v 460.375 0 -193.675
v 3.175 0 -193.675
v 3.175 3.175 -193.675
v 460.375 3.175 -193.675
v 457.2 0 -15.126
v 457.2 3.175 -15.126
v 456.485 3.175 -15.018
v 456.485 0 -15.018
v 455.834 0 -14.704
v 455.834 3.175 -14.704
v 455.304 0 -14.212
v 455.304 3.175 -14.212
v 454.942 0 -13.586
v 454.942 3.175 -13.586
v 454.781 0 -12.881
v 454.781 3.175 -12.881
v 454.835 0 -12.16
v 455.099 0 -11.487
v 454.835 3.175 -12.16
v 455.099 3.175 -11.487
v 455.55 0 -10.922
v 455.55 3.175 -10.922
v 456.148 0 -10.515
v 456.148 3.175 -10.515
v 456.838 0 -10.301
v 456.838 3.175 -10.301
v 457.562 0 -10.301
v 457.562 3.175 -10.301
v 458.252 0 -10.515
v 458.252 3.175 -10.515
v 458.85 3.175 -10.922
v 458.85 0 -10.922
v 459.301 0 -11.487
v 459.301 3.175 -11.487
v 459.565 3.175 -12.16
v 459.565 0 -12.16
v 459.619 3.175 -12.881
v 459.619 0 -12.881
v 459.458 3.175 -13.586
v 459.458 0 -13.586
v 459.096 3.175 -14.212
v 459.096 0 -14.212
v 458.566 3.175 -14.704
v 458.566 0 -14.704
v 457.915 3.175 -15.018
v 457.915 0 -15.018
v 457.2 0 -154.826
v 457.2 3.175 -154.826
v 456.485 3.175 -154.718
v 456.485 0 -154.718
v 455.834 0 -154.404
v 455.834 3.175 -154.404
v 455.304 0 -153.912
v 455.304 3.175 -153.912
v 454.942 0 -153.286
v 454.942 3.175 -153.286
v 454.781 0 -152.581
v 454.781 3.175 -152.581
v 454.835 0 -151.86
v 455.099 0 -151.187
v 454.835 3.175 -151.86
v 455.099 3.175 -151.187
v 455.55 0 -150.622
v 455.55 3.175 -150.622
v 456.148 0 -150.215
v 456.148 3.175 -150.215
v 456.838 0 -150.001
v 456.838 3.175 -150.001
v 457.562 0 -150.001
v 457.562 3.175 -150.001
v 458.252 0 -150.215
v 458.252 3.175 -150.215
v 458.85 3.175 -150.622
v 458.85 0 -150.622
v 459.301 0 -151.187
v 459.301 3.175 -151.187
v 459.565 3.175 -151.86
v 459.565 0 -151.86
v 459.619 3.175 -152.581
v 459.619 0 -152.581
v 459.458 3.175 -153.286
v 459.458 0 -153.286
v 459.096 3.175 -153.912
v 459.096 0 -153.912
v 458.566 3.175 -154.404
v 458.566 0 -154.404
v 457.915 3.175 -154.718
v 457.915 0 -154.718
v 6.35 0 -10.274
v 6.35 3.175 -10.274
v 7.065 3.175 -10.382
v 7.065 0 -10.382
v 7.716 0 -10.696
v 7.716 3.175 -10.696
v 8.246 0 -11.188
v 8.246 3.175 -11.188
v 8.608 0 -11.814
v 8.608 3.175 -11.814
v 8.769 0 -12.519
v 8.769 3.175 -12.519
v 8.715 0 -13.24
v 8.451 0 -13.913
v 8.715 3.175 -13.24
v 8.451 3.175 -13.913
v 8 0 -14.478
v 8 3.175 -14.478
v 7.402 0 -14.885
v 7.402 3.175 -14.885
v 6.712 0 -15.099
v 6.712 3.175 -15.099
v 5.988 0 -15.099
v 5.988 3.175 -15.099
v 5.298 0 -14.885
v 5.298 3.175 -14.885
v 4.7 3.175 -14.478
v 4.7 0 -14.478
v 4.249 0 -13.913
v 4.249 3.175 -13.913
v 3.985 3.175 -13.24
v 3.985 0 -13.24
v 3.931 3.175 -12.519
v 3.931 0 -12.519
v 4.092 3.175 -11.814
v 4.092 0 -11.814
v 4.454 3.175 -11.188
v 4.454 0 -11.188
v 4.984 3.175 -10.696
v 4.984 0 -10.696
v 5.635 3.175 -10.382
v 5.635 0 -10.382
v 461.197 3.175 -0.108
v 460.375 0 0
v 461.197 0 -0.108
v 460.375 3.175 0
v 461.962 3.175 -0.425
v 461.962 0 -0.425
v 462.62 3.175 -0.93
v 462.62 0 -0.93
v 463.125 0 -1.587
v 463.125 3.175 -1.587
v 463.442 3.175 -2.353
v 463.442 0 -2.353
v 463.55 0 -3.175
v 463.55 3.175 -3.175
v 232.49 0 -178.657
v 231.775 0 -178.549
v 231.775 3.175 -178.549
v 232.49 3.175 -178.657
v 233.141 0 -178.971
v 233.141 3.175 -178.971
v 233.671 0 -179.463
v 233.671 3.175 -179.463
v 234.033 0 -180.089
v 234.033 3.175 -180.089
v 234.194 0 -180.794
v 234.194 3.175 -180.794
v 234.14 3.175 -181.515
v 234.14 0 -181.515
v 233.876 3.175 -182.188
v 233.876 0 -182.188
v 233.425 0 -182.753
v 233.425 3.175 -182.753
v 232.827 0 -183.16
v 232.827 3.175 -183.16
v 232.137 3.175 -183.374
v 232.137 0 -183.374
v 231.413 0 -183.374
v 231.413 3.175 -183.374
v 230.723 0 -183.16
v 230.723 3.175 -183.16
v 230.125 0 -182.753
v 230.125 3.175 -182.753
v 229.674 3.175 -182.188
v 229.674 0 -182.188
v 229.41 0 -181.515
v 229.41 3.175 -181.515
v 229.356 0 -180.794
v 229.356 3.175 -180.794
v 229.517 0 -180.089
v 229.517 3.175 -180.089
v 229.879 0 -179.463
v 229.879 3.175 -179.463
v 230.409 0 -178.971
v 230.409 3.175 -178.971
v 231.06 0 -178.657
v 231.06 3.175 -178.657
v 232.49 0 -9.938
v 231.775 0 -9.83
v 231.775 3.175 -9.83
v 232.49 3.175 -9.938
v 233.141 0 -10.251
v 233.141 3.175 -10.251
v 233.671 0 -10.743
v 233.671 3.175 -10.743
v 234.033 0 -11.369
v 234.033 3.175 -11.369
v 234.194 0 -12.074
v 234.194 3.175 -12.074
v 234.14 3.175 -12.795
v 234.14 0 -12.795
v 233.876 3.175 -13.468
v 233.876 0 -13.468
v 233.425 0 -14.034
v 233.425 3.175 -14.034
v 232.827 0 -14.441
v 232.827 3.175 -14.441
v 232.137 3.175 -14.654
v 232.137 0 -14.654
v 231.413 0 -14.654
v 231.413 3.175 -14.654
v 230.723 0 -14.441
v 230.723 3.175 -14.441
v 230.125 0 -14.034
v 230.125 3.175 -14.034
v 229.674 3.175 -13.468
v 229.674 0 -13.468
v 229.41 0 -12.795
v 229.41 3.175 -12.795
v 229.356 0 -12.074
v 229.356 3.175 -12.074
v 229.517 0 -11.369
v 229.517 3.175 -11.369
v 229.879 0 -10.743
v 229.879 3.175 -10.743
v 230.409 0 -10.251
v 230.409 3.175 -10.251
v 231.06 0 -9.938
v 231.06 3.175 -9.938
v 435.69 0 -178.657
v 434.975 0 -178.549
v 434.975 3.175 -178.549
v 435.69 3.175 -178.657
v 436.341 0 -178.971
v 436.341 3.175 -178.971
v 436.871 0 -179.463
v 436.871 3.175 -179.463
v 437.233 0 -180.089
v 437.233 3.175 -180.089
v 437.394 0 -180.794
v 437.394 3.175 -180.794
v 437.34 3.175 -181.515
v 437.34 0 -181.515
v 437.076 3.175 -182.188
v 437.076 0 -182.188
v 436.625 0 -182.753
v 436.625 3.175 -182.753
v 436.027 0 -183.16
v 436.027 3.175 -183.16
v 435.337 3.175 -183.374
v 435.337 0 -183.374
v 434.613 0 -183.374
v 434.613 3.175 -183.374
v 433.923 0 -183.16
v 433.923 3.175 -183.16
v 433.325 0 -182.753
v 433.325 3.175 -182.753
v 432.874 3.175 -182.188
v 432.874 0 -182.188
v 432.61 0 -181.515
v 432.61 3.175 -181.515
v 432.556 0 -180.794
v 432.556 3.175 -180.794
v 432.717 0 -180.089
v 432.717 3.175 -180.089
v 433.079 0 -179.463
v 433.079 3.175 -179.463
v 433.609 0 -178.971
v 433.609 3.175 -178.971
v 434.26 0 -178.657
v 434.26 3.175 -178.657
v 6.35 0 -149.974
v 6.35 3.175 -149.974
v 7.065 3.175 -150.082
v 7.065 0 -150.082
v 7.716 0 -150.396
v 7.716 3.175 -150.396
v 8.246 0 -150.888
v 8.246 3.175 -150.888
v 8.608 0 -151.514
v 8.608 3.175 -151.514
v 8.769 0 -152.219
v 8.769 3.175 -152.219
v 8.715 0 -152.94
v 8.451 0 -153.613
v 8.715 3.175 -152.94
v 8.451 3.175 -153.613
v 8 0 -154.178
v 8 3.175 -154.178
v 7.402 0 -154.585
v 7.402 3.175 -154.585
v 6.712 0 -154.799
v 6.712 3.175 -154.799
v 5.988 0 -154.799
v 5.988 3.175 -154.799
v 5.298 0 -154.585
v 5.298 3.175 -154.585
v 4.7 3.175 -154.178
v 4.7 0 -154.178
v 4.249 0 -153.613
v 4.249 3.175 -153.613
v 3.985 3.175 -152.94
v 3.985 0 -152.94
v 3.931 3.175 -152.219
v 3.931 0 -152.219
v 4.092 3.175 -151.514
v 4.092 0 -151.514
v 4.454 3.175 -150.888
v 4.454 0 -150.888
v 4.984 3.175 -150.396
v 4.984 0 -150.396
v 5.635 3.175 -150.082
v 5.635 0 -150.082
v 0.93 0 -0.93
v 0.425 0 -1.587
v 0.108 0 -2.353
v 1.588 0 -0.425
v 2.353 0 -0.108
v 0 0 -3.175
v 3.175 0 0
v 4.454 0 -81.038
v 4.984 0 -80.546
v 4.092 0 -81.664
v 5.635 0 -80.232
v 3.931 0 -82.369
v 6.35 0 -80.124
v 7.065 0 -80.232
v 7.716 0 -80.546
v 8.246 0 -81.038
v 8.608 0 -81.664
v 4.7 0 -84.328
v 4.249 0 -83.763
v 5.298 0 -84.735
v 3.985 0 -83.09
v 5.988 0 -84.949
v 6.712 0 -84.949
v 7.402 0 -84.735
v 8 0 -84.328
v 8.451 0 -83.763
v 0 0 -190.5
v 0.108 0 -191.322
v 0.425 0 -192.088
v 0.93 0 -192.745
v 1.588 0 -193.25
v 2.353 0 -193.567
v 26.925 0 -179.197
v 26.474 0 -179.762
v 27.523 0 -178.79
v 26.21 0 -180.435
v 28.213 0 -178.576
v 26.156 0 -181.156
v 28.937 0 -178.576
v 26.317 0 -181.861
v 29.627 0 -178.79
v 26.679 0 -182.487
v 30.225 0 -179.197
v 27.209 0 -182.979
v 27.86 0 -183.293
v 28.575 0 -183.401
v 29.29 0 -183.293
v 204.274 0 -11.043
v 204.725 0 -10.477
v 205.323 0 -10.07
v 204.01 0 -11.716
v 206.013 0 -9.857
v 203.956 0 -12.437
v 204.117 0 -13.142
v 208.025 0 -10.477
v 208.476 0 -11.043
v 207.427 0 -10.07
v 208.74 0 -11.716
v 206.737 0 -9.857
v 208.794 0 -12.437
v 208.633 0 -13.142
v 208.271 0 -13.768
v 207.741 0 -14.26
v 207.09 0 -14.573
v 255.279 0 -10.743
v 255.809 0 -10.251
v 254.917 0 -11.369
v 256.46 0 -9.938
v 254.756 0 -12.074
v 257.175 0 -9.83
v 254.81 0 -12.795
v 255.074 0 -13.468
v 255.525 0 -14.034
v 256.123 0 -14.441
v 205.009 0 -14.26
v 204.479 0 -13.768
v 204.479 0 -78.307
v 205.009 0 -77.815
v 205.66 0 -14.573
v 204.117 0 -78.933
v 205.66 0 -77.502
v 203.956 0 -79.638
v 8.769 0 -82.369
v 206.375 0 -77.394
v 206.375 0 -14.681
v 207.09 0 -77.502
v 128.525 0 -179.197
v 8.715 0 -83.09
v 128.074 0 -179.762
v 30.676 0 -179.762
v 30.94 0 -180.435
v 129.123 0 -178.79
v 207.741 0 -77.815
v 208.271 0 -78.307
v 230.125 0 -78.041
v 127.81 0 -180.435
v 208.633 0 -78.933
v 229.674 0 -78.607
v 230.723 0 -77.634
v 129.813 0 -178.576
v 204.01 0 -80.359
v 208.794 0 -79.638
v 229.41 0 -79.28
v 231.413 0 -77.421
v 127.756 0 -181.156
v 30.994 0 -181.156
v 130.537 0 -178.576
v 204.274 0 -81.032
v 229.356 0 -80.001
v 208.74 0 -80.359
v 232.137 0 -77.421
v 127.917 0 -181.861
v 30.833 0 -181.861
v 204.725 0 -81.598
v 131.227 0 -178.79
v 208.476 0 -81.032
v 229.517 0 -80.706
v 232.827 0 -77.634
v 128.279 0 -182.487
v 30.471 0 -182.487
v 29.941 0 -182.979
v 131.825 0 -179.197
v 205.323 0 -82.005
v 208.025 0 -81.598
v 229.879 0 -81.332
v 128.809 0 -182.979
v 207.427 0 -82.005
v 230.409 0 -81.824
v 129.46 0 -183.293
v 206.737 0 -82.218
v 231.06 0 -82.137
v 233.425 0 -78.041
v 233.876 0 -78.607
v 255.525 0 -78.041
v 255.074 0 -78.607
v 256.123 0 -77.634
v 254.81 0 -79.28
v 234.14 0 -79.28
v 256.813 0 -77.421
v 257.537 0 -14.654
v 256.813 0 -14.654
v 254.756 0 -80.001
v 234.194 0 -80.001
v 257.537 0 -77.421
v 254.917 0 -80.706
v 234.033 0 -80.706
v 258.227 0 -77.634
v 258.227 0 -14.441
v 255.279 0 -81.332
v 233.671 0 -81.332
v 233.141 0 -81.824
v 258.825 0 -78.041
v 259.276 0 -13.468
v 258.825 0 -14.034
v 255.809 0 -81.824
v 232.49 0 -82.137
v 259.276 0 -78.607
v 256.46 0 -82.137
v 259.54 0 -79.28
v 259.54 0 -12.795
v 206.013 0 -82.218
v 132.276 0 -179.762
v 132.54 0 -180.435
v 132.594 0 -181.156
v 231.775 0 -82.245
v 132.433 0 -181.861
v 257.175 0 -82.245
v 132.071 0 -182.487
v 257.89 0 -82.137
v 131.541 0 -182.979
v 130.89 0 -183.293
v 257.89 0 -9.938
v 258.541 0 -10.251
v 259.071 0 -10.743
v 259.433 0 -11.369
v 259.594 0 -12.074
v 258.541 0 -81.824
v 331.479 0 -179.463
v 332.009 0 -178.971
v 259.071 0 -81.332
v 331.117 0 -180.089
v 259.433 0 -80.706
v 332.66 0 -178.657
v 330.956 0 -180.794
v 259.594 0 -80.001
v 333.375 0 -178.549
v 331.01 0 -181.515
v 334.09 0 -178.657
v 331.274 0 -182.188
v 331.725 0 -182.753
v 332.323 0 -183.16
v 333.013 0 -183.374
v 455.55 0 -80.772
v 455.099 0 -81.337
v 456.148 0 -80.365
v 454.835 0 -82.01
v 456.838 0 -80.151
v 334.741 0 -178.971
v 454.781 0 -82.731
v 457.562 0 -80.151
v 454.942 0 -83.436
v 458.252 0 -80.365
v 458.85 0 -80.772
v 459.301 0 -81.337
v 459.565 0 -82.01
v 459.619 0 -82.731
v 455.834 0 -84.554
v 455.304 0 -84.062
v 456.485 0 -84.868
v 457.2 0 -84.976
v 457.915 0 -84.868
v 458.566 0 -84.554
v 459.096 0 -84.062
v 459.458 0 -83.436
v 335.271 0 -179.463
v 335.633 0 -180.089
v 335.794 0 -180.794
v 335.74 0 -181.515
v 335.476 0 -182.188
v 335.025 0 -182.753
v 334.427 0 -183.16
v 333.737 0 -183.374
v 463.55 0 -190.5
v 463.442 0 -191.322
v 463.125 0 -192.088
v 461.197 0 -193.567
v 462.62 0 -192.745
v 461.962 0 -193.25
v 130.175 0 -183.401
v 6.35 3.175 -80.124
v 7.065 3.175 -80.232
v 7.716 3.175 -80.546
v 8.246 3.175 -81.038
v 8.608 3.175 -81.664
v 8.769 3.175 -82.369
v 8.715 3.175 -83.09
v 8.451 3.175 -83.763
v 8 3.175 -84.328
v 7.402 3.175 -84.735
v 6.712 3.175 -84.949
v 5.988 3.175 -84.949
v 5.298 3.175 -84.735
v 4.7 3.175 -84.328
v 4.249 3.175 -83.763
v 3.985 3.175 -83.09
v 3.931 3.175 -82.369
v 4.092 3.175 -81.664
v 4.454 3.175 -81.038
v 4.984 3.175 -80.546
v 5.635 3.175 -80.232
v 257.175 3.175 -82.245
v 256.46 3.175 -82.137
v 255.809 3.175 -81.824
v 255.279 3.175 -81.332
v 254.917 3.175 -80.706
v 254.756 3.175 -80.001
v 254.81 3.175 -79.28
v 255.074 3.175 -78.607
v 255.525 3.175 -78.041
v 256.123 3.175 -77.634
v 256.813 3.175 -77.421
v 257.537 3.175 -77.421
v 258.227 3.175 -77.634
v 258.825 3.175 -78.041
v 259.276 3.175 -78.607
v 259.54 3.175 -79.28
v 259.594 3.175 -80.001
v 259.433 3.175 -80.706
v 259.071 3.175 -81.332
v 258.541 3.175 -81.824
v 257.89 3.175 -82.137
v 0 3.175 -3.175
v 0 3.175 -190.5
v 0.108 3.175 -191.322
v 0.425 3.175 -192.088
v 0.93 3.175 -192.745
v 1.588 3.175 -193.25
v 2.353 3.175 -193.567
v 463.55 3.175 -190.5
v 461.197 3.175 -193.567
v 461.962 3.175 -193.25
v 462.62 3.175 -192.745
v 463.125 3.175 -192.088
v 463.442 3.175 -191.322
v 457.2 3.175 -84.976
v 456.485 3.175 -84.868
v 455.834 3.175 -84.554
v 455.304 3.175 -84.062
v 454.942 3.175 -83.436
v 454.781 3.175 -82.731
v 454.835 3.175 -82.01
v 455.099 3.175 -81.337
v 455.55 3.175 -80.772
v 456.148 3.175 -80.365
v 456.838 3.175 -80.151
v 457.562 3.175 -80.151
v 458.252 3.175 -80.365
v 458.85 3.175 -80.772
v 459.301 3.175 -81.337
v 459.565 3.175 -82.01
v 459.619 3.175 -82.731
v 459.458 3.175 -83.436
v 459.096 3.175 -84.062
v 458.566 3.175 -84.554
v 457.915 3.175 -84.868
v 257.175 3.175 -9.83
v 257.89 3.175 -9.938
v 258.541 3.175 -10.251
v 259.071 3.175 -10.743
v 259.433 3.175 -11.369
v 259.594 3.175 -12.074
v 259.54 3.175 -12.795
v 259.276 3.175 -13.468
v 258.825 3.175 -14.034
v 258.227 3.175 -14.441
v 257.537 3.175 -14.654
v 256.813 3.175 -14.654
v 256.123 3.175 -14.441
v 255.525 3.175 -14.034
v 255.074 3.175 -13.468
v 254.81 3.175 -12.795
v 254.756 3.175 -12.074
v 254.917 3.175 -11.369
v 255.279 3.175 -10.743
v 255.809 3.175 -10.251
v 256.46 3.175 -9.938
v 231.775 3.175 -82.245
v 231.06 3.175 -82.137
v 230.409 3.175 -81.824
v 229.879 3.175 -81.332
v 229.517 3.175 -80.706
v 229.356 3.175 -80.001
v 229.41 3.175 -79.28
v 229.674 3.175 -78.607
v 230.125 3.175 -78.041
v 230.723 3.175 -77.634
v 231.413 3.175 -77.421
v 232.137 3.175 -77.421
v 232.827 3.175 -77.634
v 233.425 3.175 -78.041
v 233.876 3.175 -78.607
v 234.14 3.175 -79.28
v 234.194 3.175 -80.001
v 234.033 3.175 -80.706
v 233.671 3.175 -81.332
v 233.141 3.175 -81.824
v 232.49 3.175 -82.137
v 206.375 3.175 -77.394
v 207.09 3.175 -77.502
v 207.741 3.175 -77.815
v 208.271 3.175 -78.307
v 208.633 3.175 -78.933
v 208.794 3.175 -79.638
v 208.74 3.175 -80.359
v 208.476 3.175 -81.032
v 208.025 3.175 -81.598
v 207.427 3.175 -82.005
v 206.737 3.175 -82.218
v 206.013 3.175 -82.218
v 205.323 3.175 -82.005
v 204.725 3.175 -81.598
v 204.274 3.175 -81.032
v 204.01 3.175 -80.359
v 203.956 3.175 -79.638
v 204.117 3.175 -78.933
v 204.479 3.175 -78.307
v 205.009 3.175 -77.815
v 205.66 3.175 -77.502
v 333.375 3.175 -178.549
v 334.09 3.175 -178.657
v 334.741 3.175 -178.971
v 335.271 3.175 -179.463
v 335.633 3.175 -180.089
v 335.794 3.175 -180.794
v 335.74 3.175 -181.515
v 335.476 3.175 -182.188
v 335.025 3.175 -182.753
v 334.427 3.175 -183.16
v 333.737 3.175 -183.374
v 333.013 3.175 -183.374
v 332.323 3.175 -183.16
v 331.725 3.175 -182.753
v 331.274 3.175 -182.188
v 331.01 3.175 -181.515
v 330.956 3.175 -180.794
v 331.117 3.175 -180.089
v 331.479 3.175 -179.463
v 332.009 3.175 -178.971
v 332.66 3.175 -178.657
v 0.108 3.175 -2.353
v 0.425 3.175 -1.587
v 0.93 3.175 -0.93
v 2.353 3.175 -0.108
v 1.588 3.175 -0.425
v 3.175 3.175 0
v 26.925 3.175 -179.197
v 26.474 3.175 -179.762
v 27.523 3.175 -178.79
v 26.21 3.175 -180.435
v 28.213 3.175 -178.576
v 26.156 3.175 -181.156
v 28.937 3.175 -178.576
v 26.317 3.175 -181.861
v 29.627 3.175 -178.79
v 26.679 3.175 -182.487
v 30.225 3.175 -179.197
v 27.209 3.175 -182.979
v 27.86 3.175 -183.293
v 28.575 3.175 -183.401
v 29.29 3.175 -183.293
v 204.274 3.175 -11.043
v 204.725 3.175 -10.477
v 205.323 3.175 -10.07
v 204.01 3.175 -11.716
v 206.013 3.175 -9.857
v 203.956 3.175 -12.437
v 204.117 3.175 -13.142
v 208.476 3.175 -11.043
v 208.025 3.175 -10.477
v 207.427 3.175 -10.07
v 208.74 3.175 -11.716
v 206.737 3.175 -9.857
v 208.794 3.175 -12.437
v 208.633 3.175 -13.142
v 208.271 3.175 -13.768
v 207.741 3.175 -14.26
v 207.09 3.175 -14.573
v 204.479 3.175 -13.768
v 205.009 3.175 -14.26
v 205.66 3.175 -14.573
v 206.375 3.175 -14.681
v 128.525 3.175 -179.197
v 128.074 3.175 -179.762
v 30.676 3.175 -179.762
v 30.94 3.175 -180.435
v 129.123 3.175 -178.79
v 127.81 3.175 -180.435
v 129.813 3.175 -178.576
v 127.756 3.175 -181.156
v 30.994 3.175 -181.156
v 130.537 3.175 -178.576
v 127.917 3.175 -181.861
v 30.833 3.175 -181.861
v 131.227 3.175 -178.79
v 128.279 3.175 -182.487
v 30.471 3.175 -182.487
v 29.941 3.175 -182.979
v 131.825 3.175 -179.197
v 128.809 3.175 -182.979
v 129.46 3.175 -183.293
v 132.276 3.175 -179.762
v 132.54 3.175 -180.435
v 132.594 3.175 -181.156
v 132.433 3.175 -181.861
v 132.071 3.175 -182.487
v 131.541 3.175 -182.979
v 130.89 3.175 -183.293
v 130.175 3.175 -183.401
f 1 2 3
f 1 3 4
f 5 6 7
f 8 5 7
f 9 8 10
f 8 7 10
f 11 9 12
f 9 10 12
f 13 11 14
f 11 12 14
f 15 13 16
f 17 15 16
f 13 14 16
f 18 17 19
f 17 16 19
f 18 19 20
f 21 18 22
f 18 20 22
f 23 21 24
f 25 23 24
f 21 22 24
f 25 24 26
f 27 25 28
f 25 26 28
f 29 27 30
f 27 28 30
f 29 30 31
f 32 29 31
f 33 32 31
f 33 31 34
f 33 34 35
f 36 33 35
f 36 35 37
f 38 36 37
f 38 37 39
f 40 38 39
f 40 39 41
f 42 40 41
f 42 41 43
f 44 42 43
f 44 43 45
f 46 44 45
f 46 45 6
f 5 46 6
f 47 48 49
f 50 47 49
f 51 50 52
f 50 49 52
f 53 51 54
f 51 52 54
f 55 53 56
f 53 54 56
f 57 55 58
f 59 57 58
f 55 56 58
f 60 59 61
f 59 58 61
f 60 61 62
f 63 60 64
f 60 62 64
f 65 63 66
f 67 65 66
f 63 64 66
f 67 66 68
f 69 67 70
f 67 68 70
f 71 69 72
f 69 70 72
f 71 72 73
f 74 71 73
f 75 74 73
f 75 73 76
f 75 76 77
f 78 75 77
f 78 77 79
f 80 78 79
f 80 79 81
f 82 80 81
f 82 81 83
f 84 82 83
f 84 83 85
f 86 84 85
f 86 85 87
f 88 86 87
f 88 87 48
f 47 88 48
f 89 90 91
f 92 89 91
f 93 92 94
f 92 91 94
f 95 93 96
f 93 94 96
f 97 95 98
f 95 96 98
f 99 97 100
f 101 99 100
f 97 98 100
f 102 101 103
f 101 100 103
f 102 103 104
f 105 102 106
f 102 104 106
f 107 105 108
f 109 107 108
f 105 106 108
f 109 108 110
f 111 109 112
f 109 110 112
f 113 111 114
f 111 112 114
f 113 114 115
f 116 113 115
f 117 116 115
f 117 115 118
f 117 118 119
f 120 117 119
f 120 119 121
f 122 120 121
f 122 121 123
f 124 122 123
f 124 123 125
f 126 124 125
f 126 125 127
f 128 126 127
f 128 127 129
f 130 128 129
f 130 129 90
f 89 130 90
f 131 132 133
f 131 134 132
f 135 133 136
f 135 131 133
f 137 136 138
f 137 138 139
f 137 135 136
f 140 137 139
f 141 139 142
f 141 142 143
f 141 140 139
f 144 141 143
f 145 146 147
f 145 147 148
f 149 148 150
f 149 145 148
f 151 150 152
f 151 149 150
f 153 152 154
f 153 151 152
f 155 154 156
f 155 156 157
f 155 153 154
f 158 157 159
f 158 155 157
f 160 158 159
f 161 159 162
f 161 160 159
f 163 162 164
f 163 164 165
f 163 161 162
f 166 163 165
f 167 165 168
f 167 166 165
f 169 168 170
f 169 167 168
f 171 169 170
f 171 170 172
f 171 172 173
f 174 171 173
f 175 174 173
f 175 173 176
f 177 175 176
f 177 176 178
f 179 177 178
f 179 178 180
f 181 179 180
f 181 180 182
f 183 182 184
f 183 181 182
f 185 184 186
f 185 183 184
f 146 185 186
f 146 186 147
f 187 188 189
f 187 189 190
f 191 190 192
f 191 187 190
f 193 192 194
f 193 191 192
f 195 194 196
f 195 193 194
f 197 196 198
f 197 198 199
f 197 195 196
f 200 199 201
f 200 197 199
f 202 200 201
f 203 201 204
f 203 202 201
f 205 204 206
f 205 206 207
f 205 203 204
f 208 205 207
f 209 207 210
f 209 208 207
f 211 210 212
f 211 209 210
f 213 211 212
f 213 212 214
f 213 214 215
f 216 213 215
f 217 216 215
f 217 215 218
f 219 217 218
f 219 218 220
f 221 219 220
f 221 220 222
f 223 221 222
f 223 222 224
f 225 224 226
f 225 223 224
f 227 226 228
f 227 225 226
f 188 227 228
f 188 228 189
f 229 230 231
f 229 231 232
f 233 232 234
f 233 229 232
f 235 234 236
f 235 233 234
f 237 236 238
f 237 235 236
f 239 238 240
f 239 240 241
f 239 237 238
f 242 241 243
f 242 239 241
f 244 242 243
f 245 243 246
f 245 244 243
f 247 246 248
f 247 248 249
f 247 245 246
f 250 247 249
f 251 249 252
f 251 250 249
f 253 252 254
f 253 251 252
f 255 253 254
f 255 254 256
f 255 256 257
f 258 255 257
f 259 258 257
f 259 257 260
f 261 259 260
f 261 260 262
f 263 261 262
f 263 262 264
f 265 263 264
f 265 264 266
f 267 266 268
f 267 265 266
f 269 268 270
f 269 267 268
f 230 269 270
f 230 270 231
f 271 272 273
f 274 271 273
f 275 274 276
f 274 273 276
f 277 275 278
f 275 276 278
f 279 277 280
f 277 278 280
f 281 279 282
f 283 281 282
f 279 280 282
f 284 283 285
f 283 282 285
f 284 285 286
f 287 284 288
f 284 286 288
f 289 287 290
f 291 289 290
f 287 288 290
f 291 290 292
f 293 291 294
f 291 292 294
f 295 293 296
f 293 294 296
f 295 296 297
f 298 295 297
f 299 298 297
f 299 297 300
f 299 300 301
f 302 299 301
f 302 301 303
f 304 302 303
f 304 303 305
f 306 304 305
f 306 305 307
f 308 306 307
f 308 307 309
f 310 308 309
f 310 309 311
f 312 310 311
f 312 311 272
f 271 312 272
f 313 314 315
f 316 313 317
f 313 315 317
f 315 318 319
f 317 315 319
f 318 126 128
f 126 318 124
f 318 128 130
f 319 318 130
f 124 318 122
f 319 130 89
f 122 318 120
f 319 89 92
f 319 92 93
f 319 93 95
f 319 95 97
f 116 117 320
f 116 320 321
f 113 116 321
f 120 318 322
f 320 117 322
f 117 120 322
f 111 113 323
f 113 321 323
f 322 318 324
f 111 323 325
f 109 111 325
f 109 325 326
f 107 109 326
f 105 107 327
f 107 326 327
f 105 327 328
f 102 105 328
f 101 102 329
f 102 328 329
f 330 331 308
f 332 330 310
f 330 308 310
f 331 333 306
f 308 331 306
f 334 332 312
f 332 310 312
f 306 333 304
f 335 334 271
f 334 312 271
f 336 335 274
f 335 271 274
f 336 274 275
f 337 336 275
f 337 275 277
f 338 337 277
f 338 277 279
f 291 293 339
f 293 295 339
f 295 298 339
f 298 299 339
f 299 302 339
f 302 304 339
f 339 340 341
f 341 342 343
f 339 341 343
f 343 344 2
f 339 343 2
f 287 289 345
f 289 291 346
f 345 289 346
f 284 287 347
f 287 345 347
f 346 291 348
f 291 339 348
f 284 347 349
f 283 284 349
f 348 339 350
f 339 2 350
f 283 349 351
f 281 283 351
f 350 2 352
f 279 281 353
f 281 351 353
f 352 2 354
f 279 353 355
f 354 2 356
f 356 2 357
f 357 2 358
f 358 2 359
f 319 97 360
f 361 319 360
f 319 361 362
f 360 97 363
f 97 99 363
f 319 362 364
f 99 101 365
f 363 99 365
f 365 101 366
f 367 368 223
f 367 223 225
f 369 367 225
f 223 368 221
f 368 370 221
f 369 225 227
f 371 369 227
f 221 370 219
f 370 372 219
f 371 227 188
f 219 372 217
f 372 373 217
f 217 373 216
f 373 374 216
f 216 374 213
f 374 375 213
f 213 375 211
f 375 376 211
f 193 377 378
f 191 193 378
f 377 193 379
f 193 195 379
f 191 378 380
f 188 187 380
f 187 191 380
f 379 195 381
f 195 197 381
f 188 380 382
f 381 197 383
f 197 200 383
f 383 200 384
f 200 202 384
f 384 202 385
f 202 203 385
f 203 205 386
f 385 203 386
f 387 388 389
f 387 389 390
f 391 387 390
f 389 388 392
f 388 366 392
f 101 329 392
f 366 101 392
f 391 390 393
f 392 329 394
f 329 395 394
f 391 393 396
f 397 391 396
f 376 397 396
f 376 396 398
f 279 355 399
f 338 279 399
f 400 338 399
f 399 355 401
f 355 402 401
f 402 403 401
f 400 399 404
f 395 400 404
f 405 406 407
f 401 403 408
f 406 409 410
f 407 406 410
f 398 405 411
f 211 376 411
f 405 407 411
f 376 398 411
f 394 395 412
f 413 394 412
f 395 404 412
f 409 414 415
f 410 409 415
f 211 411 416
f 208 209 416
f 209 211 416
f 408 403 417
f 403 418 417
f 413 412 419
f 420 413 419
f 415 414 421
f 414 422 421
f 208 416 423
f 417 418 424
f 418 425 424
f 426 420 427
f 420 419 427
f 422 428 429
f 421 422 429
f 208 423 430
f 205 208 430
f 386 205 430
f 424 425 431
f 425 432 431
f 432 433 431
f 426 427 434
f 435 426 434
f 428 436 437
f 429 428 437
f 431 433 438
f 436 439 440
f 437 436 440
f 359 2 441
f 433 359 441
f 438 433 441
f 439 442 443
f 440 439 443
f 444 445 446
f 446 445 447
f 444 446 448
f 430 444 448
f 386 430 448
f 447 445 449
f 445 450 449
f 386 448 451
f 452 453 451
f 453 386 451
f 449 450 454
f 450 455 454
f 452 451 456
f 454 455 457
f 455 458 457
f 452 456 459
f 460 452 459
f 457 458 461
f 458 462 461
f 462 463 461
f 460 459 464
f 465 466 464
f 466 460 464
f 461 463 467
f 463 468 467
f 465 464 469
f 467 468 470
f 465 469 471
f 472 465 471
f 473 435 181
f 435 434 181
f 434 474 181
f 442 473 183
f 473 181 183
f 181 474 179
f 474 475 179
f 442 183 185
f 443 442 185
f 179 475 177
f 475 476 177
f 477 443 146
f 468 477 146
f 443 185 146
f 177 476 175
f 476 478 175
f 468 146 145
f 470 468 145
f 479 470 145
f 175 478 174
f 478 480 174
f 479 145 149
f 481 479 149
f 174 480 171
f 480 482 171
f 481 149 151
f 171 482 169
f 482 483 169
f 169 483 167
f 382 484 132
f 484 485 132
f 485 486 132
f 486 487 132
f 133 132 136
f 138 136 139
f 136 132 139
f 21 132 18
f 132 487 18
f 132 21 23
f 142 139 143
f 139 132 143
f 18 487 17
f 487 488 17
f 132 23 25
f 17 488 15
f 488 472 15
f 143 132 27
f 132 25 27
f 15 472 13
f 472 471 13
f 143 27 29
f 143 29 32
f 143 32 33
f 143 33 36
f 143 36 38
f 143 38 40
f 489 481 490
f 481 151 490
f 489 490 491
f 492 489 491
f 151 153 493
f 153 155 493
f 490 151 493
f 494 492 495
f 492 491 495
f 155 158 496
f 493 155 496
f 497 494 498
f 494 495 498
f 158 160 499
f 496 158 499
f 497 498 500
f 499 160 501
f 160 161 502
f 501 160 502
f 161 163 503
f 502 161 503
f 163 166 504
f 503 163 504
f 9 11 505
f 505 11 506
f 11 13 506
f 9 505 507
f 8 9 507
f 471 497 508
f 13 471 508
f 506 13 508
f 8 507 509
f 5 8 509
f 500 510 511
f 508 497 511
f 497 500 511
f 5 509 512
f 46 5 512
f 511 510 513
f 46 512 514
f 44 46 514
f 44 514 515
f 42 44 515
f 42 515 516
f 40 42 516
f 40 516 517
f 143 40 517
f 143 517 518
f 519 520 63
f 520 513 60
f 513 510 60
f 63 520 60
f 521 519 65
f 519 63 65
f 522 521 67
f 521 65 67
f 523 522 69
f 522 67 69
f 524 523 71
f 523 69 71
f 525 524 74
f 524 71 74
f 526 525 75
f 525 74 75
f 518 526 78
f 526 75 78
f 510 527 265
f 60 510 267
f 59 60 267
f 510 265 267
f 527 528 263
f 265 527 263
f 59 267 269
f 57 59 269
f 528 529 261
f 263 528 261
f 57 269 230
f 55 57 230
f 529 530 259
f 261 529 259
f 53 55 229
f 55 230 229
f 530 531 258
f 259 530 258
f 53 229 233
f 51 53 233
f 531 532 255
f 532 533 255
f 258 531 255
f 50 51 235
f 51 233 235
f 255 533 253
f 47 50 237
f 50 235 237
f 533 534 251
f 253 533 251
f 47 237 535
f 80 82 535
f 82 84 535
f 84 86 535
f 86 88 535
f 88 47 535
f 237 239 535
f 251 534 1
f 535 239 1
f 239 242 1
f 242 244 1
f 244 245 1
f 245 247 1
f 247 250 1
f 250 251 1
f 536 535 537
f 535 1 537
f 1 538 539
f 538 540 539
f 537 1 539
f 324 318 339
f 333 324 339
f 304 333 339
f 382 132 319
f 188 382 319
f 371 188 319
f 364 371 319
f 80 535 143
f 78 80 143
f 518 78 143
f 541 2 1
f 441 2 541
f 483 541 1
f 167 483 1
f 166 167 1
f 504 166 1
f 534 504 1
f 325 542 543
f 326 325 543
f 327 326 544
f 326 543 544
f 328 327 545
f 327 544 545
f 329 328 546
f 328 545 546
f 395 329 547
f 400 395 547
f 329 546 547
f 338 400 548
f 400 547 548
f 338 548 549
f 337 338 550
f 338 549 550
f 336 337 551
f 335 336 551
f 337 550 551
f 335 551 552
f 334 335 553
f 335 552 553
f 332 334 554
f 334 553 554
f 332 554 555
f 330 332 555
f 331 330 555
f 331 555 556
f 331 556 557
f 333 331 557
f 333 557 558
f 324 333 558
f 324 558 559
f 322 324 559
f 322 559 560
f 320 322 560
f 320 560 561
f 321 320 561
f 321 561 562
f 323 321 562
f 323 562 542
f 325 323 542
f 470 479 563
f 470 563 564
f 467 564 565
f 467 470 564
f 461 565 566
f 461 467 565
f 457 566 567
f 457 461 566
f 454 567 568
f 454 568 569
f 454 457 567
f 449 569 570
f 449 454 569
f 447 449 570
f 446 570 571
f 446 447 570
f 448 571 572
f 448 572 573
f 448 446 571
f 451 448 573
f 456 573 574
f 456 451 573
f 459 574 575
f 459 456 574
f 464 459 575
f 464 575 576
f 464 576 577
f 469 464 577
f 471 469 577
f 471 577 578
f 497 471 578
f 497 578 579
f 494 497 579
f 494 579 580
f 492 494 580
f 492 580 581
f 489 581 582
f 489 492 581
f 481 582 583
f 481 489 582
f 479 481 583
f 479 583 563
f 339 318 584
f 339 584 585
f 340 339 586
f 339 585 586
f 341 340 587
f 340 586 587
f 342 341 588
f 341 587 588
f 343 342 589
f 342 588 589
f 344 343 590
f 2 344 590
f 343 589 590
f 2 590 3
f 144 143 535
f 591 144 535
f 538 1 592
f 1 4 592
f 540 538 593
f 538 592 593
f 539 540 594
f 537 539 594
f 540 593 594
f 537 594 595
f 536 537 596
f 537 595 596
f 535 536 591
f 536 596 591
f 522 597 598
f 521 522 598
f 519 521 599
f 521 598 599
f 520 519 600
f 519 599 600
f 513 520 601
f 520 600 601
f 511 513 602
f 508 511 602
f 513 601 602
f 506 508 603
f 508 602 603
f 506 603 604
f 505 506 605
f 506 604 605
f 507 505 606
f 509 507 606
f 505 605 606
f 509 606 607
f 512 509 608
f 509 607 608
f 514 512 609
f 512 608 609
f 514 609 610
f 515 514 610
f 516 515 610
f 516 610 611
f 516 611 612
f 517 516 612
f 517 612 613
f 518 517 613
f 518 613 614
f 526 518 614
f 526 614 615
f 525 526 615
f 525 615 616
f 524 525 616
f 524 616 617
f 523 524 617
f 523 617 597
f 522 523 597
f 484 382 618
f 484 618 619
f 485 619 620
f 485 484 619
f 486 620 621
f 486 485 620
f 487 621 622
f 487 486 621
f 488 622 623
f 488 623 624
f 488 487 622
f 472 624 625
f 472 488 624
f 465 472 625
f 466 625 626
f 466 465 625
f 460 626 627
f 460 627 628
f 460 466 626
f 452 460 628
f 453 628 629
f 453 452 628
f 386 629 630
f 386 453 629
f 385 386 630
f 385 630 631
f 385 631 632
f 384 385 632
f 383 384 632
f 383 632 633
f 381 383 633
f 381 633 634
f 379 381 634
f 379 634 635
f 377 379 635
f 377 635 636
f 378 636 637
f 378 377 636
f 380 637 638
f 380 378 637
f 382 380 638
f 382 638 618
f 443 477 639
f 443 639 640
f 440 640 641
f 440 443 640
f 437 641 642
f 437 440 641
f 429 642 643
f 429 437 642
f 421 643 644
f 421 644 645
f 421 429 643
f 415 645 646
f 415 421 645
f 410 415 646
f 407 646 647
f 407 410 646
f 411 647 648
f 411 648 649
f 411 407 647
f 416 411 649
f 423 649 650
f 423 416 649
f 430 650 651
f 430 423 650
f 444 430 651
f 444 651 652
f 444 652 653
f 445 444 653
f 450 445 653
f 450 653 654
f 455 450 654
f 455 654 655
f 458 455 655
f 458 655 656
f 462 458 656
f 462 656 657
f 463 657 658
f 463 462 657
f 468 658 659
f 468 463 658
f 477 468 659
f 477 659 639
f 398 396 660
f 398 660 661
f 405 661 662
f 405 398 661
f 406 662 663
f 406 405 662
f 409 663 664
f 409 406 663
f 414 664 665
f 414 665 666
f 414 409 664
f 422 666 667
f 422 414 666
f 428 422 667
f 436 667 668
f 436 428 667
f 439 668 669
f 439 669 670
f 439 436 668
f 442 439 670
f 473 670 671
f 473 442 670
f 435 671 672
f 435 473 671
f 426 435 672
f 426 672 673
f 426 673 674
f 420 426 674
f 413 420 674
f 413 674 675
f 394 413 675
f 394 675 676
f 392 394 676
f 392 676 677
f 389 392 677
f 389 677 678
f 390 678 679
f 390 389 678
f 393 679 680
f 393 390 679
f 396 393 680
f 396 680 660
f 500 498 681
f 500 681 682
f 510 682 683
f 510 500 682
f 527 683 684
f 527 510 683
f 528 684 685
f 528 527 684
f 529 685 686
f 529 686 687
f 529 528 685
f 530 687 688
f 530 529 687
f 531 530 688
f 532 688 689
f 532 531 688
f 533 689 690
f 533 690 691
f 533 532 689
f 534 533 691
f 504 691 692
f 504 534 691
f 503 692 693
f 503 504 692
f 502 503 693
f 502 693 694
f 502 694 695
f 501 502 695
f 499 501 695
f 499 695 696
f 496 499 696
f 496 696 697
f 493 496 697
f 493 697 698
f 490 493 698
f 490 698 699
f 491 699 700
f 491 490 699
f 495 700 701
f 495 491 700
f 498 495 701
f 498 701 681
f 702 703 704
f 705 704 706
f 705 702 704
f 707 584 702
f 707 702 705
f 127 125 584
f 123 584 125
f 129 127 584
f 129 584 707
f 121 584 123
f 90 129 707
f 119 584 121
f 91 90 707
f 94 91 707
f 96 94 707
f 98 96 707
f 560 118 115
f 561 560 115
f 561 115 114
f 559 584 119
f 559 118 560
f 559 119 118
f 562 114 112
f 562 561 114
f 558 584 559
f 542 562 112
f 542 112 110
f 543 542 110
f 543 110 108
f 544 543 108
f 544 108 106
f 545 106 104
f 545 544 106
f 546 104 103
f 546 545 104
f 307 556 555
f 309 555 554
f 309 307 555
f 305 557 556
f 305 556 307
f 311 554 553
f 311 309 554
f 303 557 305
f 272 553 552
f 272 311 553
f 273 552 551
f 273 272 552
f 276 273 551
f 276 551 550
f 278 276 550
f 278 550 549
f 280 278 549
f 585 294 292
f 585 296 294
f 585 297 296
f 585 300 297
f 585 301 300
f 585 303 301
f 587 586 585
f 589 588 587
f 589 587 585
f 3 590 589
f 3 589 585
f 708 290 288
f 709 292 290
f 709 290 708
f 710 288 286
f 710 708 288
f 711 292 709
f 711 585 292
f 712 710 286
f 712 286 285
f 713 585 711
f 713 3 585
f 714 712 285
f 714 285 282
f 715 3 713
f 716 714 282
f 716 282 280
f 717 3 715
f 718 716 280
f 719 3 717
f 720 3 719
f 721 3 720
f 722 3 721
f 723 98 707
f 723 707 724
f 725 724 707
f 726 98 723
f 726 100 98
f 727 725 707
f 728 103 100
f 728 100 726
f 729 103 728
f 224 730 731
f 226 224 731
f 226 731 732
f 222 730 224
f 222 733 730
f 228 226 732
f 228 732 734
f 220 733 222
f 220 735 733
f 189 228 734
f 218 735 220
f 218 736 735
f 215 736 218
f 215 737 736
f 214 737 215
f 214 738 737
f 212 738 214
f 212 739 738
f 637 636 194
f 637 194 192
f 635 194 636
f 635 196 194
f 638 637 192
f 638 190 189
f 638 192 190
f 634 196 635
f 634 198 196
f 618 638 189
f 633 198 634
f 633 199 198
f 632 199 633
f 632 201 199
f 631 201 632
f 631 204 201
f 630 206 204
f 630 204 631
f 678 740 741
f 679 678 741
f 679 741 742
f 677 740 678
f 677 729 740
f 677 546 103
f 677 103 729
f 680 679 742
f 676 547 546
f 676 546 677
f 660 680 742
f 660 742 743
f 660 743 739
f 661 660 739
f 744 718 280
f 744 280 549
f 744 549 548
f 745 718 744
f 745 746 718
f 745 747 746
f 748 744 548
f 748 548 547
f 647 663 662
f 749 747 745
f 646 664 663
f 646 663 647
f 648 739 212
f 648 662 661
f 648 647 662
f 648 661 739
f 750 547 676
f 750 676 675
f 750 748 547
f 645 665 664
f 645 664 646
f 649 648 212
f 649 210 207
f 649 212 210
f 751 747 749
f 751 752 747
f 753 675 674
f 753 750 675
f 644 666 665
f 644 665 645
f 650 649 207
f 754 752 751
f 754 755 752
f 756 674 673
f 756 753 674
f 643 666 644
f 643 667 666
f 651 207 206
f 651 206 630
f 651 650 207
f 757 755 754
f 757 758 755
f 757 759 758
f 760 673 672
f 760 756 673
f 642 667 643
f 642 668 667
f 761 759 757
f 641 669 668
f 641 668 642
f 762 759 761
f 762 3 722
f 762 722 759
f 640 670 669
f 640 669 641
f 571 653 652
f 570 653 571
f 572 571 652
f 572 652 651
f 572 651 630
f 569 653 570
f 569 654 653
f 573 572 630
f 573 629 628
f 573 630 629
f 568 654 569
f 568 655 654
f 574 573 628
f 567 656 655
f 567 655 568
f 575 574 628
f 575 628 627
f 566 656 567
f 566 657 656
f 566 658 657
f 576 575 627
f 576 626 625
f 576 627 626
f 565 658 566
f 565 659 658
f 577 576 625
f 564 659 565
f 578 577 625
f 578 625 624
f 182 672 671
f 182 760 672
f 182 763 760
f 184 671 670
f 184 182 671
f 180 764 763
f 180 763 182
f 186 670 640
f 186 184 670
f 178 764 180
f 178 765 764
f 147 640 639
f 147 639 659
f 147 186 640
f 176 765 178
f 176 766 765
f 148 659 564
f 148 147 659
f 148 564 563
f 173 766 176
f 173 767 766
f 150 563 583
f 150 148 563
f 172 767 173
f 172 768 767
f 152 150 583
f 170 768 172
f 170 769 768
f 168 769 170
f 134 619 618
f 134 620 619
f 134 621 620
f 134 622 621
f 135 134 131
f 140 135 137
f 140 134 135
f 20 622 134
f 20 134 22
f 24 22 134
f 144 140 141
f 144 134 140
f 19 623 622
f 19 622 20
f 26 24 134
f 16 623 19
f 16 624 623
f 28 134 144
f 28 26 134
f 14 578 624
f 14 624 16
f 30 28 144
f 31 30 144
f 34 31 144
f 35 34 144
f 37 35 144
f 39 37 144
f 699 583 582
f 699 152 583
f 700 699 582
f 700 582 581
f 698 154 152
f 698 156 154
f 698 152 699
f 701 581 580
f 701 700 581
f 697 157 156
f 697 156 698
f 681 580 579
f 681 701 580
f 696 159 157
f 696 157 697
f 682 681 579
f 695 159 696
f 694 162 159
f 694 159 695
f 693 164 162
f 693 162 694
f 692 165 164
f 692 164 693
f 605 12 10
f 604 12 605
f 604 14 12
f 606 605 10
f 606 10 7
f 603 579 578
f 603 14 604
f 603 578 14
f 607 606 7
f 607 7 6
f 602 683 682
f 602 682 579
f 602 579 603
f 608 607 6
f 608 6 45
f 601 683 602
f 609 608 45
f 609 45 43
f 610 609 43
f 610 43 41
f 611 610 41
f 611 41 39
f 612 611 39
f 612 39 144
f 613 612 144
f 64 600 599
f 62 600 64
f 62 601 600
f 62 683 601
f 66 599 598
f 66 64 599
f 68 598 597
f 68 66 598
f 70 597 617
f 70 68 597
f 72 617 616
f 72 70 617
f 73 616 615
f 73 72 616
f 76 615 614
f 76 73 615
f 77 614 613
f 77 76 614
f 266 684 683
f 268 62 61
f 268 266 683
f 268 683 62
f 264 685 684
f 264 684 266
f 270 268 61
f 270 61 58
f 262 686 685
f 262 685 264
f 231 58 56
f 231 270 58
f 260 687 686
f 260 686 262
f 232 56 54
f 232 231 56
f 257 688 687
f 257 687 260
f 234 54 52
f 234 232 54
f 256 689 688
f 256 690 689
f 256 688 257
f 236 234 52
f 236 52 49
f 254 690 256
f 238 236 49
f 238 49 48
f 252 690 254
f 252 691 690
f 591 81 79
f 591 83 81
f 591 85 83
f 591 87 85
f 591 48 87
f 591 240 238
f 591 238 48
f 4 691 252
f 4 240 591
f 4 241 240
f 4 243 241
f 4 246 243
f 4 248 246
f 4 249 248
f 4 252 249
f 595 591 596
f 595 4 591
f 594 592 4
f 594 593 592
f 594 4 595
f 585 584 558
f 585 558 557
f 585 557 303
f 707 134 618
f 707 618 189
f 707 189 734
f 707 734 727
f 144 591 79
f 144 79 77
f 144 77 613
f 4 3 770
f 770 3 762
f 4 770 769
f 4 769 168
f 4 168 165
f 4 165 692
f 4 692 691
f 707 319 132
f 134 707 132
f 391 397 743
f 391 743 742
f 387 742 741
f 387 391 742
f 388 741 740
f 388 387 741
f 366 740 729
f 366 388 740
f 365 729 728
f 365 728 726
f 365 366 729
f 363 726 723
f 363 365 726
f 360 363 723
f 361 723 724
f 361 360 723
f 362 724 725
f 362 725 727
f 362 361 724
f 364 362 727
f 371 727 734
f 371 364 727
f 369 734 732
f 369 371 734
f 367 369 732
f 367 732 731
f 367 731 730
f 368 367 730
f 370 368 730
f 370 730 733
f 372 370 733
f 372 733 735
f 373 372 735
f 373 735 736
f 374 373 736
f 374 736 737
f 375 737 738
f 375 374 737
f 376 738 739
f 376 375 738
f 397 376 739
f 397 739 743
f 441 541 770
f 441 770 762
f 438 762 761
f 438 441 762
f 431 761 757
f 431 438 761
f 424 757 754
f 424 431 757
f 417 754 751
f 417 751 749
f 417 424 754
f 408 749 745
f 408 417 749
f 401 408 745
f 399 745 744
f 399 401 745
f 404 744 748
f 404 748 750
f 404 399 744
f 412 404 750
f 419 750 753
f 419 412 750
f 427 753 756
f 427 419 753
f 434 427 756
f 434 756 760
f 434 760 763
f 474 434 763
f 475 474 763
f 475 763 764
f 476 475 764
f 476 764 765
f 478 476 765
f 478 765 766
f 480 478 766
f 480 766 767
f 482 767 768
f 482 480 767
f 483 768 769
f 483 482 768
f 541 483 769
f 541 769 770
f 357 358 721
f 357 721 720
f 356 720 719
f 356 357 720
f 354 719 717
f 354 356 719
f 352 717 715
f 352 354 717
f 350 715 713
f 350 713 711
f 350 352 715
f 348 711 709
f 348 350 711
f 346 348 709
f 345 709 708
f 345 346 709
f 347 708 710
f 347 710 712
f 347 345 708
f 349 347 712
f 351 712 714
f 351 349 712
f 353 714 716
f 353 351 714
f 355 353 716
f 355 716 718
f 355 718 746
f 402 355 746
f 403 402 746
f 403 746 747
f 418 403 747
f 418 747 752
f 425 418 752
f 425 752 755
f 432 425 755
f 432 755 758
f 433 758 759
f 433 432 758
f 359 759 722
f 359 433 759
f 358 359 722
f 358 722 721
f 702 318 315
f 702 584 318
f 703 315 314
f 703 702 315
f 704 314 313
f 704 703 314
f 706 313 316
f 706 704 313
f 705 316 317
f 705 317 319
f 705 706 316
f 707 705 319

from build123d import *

# Parameters (mm, degrees)
SKETCH1_W           = 463.55
SKETCH1_H           = 193.675
SKETCH1_R           = 2.4257
BOSS_EXTRUDE1_DEPTH = 3.175
SKETCH2_R           = 2.4257
CUT_EXTRUDE1_DEPTH  = 503.392962481
FILLET1_R           = 3.175


with BuildPart() as part:
    # Sketch1 → Boss-Extrude1 (new body)
    with BuildSketch(Plane(origin=(0, 0, 0), x_dir=(1, 0, 0), z_dir=(0, 1, 0))):
        with Locations((231.775, 96.8375)):
            Rectangle(SKETCH1_W, SKETCH1_H)
        with Locations(Location((231.775, 12.2555, 0), (0, 0, 270))):
            Circle(SKETCH1_R, mode=Mode.SUBTRACT)
        with Locations(Location((257.175, 12.2555, 0), (0, 0, 270))):
            Circle(SKETCH1_R, mode=Mode.SUBTRACT)
        with Locations(Location((206.375, 12.2555, 0), (0, 0, 90))):
            Circle(SKETCH1_R, mode=Mode.SUBTRACT)
        with Locations(Location((257.175, 79.8195, 0), (0, 0, 90))):
            Circle(SKETCH1_R, mode=Mode.SUBTRACT)
        with Locations(Location((231.775, 79.8195, 0), (0, 0, 90))):
            Circle(SKETCH1_R, mode=Mode.SUBTRACT)
        with Locations(Location((206.375, 79.8195, 0), (0, 0, 270))):
            Circle(SKETCH1_R, mode=Mode.SUBTRACT)
        with Locations(Location((231.775, 180.975, 0), (0, 0, 270))):
            Circle(SKETCH1_R, mode=Mode.SUBTRACT)
        with Locations(Location((333.375, 180.975, 0), (0, 0, 270))):
            Circle(SKETCH1_R, mode=Mode.SUBTRACT)
        with Locations(Location((434.975, 180.975, 0), (0, 0, 270))):
            Circle(SKETCH1_R, mode=Mode.SUBTRACT)
        with Locations(Location((28.575, 180.975, 0), (0, 0, 90))):
            Circle(SKETCH1_R, mode=Mode.SUBTRACT)
        with Locations(Location((130.175, 180.975, 0), (0, 0, 90))):
            Circle(SKETCH1_R, mode=Mode.SUBTRACT)
    extrude(amount=BOSS_EXTRUDE1_DEPTH)

    # Sketch2 → Cut-Extrude1 (cut, through all)
    with BuildSketch(Plane(origin=(0, 3.175, 0), x_dir=(1, 0, 0), z_dir=(0, 1, 0))):
        with Locations(Location((6.35, 12.7, 0), (0, 0, 270))):
            Circle(SKETCH2_R)
        with Locations(Location((6.35, 82.55, 0), (0, 0, 270))):
            Circle(SKETCH2_R)
        with Locations(Location((6.35, 152.4, 0), (0, 0, 270))):
            Circle(SKETCH2_R)
        with Locations((6.35, 222.25)):
            Circle(SKETCH2_R)
        with Locations((457.2, 222.25)):
            Circle(SKETCH2_R)
        with Locations(Location((457.2, 152.4, 0), (0, 0, 90))):
            Circle(SKETCH2_R)
        with Locations(Location((457.2, 82.55, 0), (0, 0, 90))):
            Circle(SKETCH2_R)
        with Locations(Location((457.2, 12.7, 0), (0, 0, 90))):
            Circle(SKETCH2_R)
    extrude(amount=-CUT_EXTRUDE1_DEPTH, mode=Mode.SUBTRACT)

    # Fillet1
    fillet1_edges = [part.edges().sort_by_distance(p)[0] for p in [
        (0, 1.5875, -193.675),
        (463.55, 1.5875, -193.675),
        (463.55, 1.5875, 0),
        (0, 1.5875, 0),
    ]]
    fillet(fillet1_edges, radius=FILLET1_R)


solid = part.part
